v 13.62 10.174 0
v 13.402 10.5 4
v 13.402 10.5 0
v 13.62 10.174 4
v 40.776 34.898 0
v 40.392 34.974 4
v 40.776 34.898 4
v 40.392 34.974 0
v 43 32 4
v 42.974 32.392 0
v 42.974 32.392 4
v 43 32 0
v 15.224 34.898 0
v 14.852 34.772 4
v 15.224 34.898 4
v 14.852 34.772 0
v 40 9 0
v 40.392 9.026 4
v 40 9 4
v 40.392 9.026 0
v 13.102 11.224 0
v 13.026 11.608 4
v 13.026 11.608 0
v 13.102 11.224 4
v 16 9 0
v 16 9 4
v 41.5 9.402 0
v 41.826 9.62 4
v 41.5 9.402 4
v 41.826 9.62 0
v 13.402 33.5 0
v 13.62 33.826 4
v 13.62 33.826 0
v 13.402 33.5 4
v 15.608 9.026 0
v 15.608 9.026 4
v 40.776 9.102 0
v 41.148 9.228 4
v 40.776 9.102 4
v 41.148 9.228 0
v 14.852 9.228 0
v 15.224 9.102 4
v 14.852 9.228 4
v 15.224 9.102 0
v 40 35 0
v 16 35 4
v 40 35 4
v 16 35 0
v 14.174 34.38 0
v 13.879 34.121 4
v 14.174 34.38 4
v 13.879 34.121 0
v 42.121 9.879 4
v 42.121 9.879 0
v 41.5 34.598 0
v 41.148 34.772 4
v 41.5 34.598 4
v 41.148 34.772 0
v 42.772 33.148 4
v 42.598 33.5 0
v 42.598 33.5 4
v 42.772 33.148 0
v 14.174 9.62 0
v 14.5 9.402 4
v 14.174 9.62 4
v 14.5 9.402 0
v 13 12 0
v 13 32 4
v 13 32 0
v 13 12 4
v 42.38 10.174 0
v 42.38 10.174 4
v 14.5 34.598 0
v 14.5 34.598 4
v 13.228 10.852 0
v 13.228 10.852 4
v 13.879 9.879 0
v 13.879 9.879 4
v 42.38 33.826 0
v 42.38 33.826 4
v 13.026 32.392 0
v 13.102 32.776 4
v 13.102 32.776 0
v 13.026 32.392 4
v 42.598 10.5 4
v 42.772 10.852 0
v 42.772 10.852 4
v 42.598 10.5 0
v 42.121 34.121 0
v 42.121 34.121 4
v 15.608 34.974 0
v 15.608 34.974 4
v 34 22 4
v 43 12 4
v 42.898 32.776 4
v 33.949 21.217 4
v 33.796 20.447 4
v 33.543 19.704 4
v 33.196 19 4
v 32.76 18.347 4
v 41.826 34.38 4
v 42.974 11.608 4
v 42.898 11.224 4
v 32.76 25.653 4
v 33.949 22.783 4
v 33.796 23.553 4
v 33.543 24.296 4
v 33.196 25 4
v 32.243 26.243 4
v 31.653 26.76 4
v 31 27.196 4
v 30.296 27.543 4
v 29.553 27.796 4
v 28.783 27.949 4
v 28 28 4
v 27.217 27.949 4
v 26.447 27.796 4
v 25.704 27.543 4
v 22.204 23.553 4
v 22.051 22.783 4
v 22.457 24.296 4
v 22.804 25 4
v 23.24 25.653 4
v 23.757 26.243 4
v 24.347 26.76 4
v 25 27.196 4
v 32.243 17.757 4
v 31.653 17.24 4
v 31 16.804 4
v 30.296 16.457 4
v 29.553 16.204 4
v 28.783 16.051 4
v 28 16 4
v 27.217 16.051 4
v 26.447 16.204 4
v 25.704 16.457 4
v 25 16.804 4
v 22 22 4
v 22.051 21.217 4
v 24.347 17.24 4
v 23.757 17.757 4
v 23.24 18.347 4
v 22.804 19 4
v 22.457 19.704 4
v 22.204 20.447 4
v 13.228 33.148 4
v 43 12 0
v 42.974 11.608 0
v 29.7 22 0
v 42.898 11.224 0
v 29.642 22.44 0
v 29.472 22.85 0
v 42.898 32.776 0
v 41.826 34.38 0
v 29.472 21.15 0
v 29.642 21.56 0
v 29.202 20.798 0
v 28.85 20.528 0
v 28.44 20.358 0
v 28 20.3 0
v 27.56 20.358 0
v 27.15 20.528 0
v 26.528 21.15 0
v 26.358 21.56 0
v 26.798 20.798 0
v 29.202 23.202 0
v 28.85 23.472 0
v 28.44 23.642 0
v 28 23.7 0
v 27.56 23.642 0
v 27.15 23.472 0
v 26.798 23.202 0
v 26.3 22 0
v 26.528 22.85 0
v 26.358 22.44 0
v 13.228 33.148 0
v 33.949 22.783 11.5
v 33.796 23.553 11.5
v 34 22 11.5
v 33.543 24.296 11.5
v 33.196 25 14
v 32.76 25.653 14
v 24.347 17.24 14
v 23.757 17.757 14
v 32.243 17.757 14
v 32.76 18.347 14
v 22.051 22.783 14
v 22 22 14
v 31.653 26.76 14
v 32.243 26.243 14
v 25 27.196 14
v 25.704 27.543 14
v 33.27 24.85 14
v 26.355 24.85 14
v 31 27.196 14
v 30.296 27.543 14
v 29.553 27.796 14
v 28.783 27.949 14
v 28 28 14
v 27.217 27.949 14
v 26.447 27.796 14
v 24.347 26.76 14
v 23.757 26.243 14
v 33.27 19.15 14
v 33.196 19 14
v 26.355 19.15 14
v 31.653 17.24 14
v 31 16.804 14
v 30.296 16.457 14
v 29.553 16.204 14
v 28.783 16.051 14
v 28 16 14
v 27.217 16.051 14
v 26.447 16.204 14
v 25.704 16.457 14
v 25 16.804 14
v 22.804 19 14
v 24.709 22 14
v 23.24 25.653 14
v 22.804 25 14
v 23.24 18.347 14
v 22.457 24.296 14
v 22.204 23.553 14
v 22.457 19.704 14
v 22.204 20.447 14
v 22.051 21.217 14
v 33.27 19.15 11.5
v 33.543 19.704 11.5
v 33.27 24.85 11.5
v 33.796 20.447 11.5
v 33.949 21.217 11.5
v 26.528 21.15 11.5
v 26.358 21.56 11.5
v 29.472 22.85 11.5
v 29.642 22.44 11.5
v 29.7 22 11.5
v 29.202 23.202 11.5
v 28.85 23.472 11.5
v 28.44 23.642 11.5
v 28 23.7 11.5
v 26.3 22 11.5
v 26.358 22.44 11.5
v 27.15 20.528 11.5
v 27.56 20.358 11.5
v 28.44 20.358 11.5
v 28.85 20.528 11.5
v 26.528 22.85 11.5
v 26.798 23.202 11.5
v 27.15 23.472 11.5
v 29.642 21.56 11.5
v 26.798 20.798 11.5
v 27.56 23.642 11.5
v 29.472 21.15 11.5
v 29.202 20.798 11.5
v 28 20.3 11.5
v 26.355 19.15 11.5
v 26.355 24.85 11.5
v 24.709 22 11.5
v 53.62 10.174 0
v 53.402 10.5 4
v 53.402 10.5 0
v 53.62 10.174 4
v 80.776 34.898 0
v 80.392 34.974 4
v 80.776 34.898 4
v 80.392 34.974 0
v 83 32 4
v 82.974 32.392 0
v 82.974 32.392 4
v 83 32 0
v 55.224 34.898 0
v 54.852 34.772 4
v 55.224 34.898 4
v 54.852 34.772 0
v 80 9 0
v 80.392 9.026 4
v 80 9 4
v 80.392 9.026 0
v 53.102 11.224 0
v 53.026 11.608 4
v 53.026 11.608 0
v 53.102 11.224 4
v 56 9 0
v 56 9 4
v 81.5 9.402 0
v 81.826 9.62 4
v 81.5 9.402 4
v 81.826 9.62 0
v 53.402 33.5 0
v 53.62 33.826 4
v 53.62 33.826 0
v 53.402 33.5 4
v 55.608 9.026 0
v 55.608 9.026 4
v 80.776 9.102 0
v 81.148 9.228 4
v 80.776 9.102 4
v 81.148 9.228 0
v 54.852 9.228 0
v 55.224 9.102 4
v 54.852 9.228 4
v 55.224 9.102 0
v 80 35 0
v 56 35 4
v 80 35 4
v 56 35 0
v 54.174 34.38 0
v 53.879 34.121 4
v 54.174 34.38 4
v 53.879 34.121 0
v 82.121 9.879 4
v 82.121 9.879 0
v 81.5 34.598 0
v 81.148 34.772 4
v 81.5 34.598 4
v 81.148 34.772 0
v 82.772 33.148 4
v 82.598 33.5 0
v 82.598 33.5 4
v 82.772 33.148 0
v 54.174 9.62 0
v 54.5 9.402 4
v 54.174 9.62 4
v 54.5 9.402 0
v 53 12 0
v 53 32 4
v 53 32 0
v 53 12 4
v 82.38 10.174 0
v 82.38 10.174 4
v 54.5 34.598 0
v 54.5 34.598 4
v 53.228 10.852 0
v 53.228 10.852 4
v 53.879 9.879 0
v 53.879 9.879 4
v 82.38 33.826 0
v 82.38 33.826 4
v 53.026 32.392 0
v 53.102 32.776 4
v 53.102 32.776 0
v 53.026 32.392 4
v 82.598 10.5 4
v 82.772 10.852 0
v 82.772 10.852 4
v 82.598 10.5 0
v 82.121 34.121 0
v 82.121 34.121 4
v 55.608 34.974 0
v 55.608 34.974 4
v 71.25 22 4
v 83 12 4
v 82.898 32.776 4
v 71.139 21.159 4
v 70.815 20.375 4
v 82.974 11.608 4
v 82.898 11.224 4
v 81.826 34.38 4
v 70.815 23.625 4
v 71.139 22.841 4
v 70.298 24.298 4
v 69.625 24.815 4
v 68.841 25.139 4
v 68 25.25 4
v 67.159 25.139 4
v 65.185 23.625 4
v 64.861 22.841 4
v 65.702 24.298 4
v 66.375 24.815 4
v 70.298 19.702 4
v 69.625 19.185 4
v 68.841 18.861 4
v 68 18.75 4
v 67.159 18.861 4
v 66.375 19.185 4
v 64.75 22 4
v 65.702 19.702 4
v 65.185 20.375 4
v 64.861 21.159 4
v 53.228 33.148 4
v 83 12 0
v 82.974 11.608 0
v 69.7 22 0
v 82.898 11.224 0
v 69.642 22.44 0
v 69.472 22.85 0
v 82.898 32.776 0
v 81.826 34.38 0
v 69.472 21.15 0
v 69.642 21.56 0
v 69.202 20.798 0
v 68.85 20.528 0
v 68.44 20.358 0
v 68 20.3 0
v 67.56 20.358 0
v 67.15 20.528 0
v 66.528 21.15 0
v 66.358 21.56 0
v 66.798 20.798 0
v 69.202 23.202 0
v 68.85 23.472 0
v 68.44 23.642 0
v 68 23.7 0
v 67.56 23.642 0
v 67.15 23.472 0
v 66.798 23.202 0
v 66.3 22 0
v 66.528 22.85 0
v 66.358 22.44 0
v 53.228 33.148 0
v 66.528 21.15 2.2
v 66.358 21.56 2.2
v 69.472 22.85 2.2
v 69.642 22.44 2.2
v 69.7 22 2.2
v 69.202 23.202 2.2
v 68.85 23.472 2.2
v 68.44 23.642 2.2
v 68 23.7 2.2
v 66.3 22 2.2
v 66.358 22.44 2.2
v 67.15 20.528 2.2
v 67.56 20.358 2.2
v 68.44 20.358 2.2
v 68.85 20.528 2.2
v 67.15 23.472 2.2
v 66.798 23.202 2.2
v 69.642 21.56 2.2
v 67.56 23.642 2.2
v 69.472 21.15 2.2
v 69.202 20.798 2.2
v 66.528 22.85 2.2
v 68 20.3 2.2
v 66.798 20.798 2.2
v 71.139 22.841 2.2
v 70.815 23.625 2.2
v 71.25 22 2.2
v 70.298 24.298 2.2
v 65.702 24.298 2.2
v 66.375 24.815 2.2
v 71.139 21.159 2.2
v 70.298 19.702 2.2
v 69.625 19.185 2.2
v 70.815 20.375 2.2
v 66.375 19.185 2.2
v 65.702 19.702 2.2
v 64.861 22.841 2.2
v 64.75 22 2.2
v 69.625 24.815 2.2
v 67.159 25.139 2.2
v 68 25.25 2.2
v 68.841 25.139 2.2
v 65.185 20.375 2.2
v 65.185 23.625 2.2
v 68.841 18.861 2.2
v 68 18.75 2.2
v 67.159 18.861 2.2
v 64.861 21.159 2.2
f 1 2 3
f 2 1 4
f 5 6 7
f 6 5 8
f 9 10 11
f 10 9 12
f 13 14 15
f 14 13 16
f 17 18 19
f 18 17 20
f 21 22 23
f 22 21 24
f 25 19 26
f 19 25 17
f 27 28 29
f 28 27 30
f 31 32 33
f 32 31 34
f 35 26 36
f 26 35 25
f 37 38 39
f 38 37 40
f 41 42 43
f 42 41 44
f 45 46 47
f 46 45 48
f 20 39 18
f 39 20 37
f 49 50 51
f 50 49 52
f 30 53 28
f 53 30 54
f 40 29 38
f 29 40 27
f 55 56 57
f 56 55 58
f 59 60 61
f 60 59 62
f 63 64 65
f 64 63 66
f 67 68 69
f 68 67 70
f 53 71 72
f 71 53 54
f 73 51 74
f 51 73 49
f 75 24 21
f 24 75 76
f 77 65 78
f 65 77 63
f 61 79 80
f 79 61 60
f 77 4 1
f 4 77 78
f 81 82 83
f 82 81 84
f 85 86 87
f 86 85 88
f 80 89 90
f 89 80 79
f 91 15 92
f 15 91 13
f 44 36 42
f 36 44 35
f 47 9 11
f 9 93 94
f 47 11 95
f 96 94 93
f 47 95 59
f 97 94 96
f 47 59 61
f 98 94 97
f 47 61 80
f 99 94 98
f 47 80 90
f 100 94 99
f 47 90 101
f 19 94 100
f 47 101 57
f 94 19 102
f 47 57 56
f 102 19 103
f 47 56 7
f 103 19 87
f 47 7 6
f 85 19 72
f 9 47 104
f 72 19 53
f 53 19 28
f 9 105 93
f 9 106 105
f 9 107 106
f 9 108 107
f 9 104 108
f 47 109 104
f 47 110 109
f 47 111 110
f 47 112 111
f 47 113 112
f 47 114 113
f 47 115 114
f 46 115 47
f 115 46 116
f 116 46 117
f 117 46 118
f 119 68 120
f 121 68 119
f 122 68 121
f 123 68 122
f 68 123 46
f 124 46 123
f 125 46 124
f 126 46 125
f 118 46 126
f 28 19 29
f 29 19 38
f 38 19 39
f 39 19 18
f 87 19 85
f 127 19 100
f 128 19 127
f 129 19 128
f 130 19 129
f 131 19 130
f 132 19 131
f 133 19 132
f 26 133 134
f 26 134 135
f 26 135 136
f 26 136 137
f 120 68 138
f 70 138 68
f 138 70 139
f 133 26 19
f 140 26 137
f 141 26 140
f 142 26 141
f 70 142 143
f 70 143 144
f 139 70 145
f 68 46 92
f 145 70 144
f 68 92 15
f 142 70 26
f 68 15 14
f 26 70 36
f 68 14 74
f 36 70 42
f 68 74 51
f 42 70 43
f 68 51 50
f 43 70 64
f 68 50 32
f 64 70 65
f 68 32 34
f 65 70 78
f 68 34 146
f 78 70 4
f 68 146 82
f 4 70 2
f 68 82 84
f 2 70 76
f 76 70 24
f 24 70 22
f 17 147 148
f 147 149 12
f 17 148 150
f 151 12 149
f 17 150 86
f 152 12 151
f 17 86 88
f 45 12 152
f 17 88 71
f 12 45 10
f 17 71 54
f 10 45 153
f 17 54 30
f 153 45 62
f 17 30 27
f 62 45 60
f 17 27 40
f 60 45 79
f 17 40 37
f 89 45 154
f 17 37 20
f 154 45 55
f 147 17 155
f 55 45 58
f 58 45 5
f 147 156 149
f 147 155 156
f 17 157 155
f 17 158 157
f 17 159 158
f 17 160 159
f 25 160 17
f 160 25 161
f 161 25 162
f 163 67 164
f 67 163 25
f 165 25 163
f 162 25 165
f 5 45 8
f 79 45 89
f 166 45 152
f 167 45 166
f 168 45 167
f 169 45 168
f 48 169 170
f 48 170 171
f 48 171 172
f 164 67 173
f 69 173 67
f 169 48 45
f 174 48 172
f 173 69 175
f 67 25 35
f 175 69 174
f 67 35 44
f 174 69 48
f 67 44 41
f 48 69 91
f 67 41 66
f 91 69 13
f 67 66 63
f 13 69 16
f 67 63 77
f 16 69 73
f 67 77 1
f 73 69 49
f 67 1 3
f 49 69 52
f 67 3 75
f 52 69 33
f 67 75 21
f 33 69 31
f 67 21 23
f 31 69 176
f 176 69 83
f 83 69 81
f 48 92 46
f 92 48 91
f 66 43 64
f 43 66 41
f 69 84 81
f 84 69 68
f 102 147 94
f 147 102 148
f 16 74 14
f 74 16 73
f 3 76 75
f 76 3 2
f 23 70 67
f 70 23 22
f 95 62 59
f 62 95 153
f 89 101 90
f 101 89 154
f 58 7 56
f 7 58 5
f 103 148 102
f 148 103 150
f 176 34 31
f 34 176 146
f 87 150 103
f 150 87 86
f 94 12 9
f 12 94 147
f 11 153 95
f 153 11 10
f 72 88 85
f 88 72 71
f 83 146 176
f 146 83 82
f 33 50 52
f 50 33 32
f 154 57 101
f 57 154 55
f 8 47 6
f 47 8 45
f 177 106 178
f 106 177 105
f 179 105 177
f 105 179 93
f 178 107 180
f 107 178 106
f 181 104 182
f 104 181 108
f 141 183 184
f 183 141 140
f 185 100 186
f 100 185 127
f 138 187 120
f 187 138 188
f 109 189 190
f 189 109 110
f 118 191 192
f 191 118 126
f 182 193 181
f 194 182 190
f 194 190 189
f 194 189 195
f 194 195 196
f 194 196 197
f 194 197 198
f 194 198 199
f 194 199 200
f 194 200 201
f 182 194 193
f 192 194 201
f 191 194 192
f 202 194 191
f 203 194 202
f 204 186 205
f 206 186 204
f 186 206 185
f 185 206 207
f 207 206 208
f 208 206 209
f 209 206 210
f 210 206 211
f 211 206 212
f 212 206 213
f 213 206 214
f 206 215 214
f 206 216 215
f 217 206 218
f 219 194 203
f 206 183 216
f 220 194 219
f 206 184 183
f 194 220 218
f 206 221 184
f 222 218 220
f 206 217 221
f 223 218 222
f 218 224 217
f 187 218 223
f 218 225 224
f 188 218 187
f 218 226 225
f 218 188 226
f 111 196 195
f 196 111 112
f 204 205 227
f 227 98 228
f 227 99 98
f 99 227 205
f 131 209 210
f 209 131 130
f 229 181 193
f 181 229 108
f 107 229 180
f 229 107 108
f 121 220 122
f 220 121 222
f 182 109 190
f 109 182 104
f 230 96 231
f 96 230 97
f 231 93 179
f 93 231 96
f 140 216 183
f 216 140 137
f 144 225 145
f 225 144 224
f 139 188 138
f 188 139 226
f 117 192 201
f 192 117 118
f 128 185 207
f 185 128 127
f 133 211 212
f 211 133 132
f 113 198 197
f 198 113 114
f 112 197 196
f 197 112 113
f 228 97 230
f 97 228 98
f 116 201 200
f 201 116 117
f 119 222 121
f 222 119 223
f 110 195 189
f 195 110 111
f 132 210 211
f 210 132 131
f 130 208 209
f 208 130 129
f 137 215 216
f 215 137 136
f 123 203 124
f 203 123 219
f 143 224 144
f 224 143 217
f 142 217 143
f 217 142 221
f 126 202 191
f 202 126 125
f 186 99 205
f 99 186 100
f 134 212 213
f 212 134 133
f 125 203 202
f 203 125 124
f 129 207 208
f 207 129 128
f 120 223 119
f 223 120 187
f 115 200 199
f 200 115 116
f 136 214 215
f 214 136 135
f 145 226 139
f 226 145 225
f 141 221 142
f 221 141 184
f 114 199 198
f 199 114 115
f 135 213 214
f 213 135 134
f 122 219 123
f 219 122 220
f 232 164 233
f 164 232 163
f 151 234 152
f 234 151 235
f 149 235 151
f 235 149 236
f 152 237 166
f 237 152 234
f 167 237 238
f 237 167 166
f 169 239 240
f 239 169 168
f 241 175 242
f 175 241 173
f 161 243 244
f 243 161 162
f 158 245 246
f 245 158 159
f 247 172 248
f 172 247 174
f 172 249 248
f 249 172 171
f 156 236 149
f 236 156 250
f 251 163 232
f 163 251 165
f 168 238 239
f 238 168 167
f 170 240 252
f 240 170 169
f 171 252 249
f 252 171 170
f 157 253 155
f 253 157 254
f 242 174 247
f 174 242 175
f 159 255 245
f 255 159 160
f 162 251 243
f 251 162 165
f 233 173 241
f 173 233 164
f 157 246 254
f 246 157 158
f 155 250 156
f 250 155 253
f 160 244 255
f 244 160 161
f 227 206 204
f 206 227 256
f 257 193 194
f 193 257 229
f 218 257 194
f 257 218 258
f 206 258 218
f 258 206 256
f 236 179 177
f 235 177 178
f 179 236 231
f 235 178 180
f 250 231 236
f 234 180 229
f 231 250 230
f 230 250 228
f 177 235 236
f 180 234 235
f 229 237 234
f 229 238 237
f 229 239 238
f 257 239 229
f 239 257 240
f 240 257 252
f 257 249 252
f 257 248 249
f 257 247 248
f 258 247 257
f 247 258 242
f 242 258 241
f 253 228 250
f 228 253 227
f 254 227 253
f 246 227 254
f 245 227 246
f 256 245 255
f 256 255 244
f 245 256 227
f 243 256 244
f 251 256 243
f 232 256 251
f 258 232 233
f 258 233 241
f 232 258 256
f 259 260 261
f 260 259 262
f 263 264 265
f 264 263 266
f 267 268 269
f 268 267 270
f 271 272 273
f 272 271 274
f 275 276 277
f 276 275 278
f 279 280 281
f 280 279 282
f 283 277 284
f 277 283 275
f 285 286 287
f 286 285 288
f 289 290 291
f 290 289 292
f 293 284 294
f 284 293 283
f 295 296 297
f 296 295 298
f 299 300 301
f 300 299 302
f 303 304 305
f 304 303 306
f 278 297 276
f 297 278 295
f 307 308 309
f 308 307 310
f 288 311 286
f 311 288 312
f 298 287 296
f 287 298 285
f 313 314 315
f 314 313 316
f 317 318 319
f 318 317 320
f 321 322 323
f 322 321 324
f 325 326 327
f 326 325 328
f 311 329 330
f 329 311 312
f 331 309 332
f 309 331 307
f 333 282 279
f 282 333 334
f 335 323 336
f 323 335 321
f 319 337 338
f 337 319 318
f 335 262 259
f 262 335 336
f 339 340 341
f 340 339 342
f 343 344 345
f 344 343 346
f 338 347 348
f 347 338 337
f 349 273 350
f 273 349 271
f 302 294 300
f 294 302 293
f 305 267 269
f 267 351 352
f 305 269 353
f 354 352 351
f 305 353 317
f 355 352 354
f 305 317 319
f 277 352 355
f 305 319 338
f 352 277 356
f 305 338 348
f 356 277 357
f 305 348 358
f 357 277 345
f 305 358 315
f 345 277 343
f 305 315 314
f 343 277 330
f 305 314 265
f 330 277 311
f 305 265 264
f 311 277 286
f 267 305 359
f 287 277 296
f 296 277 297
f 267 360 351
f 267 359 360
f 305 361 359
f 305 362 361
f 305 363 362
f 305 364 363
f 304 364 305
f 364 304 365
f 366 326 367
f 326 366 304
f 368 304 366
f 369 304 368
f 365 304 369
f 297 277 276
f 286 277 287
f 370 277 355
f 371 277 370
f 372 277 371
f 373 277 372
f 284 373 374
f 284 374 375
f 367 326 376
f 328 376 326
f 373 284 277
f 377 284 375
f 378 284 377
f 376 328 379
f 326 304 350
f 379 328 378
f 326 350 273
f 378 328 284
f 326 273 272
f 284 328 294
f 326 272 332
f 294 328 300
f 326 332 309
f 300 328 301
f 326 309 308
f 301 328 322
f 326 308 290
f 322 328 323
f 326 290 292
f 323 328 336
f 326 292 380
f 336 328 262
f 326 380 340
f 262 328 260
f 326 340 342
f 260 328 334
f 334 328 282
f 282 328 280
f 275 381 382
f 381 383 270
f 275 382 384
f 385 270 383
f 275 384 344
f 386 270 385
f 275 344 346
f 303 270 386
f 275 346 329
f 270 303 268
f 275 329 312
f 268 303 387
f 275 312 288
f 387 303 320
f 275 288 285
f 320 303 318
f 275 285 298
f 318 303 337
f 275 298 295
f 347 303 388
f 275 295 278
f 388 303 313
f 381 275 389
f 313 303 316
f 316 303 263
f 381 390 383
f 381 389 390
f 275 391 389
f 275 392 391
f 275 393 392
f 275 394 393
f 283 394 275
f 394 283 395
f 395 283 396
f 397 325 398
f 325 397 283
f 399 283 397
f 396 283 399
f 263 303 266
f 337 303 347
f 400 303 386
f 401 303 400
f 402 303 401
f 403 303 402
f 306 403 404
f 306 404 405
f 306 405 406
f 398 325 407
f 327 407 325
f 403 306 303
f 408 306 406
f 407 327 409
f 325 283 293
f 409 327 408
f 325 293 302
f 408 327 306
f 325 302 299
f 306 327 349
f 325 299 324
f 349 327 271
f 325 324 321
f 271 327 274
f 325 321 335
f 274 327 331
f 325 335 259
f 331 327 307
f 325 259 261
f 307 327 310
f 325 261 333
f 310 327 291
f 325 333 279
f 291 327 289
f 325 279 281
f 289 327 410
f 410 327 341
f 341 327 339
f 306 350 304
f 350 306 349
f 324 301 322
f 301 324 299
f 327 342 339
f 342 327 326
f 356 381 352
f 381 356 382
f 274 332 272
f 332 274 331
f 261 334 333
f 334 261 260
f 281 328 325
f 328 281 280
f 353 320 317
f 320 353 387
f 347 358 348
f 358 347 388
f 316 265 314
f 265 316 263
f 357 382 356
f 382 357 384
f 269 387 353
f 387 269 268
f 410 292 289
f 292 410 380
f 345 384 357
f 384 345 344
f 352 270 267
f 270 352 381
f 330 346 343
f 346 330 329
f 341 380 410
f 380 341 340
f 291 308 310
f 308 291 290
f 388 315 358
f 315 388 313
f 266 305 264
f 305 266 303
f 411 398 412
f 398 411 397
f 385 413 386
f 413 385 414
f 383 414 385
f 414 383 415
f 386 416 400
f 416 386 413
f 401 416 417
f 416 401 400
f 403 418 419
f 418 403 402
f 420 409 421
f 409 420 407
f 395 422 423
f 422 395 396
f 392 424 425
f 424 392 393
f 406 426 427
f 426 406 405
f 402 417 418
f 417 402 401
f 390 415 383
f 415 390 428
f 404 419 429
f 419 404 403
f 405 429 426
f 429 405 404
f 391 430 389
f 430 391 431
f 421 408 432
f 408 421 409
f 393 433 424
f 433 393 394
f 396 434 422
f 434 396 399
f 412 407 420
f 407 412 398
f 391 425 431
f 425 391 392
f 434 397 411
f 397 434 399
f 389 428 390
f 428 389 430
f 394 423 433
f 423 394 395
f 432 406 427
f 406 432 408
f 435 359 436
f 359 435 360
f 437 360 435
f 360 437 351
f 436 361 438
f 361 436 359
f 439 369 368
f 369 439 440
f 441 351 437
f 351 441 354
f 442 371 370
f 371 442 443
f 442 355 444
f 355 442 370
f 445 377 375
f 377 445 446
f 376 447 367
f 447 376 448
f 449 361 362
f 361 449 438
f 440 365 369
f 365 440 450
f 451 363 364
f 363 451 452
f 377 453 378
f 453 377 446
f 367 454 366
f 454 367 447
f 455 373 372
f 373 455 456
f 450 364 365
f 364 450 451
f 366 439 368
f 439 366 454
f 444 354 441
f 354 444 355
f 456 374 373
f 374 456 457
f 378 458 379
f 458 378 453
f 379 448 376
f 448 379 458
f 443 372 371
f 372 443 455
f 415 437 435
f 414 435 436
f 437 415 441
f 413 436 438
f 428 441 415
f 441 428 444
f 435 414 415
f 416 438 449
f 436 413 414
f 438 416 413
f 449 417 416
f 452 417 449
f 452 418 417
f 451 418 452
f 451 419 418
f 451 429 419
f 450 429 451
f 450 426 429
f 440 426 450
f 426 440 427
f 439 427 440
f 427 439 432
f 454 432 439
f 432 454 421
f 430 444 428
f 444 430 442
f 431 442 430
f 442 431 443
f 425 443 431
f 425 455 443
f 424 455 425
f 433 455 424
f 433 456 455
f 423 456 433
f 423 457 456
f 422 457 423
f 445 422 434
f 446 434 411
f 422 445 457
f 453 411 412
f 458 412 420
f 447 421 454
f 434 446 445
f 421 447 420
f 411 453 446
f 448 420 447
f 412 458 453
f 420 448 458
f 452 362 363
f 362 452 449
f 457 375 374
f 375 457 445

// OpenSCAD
/*
Sample 058: Schraubdom mit seitlicher Muttertasche — M3
Generated from the FDM Mechanical Sample Library.
Units: millimetres.

Override examples:
  openscad -o custom.stl -D 'view="plate"' -D 'render_fn=64' model.scad
  openscad -o preview.png -D 'view="assembly"' model.scad
*/
use <../../../library/fdm_mechanisms.scad>

render_fn = is_undef(render_fn) ? 48 : render_fn;
view = is_undef(view) ? "plate" : view;
$fn = render_fn;

sample_nuttrap_screw(
    view=view,
    screw_d=3.4,
    nut_flat=5.7,
    nut_h=2.5,
    head_d=6.5
);
